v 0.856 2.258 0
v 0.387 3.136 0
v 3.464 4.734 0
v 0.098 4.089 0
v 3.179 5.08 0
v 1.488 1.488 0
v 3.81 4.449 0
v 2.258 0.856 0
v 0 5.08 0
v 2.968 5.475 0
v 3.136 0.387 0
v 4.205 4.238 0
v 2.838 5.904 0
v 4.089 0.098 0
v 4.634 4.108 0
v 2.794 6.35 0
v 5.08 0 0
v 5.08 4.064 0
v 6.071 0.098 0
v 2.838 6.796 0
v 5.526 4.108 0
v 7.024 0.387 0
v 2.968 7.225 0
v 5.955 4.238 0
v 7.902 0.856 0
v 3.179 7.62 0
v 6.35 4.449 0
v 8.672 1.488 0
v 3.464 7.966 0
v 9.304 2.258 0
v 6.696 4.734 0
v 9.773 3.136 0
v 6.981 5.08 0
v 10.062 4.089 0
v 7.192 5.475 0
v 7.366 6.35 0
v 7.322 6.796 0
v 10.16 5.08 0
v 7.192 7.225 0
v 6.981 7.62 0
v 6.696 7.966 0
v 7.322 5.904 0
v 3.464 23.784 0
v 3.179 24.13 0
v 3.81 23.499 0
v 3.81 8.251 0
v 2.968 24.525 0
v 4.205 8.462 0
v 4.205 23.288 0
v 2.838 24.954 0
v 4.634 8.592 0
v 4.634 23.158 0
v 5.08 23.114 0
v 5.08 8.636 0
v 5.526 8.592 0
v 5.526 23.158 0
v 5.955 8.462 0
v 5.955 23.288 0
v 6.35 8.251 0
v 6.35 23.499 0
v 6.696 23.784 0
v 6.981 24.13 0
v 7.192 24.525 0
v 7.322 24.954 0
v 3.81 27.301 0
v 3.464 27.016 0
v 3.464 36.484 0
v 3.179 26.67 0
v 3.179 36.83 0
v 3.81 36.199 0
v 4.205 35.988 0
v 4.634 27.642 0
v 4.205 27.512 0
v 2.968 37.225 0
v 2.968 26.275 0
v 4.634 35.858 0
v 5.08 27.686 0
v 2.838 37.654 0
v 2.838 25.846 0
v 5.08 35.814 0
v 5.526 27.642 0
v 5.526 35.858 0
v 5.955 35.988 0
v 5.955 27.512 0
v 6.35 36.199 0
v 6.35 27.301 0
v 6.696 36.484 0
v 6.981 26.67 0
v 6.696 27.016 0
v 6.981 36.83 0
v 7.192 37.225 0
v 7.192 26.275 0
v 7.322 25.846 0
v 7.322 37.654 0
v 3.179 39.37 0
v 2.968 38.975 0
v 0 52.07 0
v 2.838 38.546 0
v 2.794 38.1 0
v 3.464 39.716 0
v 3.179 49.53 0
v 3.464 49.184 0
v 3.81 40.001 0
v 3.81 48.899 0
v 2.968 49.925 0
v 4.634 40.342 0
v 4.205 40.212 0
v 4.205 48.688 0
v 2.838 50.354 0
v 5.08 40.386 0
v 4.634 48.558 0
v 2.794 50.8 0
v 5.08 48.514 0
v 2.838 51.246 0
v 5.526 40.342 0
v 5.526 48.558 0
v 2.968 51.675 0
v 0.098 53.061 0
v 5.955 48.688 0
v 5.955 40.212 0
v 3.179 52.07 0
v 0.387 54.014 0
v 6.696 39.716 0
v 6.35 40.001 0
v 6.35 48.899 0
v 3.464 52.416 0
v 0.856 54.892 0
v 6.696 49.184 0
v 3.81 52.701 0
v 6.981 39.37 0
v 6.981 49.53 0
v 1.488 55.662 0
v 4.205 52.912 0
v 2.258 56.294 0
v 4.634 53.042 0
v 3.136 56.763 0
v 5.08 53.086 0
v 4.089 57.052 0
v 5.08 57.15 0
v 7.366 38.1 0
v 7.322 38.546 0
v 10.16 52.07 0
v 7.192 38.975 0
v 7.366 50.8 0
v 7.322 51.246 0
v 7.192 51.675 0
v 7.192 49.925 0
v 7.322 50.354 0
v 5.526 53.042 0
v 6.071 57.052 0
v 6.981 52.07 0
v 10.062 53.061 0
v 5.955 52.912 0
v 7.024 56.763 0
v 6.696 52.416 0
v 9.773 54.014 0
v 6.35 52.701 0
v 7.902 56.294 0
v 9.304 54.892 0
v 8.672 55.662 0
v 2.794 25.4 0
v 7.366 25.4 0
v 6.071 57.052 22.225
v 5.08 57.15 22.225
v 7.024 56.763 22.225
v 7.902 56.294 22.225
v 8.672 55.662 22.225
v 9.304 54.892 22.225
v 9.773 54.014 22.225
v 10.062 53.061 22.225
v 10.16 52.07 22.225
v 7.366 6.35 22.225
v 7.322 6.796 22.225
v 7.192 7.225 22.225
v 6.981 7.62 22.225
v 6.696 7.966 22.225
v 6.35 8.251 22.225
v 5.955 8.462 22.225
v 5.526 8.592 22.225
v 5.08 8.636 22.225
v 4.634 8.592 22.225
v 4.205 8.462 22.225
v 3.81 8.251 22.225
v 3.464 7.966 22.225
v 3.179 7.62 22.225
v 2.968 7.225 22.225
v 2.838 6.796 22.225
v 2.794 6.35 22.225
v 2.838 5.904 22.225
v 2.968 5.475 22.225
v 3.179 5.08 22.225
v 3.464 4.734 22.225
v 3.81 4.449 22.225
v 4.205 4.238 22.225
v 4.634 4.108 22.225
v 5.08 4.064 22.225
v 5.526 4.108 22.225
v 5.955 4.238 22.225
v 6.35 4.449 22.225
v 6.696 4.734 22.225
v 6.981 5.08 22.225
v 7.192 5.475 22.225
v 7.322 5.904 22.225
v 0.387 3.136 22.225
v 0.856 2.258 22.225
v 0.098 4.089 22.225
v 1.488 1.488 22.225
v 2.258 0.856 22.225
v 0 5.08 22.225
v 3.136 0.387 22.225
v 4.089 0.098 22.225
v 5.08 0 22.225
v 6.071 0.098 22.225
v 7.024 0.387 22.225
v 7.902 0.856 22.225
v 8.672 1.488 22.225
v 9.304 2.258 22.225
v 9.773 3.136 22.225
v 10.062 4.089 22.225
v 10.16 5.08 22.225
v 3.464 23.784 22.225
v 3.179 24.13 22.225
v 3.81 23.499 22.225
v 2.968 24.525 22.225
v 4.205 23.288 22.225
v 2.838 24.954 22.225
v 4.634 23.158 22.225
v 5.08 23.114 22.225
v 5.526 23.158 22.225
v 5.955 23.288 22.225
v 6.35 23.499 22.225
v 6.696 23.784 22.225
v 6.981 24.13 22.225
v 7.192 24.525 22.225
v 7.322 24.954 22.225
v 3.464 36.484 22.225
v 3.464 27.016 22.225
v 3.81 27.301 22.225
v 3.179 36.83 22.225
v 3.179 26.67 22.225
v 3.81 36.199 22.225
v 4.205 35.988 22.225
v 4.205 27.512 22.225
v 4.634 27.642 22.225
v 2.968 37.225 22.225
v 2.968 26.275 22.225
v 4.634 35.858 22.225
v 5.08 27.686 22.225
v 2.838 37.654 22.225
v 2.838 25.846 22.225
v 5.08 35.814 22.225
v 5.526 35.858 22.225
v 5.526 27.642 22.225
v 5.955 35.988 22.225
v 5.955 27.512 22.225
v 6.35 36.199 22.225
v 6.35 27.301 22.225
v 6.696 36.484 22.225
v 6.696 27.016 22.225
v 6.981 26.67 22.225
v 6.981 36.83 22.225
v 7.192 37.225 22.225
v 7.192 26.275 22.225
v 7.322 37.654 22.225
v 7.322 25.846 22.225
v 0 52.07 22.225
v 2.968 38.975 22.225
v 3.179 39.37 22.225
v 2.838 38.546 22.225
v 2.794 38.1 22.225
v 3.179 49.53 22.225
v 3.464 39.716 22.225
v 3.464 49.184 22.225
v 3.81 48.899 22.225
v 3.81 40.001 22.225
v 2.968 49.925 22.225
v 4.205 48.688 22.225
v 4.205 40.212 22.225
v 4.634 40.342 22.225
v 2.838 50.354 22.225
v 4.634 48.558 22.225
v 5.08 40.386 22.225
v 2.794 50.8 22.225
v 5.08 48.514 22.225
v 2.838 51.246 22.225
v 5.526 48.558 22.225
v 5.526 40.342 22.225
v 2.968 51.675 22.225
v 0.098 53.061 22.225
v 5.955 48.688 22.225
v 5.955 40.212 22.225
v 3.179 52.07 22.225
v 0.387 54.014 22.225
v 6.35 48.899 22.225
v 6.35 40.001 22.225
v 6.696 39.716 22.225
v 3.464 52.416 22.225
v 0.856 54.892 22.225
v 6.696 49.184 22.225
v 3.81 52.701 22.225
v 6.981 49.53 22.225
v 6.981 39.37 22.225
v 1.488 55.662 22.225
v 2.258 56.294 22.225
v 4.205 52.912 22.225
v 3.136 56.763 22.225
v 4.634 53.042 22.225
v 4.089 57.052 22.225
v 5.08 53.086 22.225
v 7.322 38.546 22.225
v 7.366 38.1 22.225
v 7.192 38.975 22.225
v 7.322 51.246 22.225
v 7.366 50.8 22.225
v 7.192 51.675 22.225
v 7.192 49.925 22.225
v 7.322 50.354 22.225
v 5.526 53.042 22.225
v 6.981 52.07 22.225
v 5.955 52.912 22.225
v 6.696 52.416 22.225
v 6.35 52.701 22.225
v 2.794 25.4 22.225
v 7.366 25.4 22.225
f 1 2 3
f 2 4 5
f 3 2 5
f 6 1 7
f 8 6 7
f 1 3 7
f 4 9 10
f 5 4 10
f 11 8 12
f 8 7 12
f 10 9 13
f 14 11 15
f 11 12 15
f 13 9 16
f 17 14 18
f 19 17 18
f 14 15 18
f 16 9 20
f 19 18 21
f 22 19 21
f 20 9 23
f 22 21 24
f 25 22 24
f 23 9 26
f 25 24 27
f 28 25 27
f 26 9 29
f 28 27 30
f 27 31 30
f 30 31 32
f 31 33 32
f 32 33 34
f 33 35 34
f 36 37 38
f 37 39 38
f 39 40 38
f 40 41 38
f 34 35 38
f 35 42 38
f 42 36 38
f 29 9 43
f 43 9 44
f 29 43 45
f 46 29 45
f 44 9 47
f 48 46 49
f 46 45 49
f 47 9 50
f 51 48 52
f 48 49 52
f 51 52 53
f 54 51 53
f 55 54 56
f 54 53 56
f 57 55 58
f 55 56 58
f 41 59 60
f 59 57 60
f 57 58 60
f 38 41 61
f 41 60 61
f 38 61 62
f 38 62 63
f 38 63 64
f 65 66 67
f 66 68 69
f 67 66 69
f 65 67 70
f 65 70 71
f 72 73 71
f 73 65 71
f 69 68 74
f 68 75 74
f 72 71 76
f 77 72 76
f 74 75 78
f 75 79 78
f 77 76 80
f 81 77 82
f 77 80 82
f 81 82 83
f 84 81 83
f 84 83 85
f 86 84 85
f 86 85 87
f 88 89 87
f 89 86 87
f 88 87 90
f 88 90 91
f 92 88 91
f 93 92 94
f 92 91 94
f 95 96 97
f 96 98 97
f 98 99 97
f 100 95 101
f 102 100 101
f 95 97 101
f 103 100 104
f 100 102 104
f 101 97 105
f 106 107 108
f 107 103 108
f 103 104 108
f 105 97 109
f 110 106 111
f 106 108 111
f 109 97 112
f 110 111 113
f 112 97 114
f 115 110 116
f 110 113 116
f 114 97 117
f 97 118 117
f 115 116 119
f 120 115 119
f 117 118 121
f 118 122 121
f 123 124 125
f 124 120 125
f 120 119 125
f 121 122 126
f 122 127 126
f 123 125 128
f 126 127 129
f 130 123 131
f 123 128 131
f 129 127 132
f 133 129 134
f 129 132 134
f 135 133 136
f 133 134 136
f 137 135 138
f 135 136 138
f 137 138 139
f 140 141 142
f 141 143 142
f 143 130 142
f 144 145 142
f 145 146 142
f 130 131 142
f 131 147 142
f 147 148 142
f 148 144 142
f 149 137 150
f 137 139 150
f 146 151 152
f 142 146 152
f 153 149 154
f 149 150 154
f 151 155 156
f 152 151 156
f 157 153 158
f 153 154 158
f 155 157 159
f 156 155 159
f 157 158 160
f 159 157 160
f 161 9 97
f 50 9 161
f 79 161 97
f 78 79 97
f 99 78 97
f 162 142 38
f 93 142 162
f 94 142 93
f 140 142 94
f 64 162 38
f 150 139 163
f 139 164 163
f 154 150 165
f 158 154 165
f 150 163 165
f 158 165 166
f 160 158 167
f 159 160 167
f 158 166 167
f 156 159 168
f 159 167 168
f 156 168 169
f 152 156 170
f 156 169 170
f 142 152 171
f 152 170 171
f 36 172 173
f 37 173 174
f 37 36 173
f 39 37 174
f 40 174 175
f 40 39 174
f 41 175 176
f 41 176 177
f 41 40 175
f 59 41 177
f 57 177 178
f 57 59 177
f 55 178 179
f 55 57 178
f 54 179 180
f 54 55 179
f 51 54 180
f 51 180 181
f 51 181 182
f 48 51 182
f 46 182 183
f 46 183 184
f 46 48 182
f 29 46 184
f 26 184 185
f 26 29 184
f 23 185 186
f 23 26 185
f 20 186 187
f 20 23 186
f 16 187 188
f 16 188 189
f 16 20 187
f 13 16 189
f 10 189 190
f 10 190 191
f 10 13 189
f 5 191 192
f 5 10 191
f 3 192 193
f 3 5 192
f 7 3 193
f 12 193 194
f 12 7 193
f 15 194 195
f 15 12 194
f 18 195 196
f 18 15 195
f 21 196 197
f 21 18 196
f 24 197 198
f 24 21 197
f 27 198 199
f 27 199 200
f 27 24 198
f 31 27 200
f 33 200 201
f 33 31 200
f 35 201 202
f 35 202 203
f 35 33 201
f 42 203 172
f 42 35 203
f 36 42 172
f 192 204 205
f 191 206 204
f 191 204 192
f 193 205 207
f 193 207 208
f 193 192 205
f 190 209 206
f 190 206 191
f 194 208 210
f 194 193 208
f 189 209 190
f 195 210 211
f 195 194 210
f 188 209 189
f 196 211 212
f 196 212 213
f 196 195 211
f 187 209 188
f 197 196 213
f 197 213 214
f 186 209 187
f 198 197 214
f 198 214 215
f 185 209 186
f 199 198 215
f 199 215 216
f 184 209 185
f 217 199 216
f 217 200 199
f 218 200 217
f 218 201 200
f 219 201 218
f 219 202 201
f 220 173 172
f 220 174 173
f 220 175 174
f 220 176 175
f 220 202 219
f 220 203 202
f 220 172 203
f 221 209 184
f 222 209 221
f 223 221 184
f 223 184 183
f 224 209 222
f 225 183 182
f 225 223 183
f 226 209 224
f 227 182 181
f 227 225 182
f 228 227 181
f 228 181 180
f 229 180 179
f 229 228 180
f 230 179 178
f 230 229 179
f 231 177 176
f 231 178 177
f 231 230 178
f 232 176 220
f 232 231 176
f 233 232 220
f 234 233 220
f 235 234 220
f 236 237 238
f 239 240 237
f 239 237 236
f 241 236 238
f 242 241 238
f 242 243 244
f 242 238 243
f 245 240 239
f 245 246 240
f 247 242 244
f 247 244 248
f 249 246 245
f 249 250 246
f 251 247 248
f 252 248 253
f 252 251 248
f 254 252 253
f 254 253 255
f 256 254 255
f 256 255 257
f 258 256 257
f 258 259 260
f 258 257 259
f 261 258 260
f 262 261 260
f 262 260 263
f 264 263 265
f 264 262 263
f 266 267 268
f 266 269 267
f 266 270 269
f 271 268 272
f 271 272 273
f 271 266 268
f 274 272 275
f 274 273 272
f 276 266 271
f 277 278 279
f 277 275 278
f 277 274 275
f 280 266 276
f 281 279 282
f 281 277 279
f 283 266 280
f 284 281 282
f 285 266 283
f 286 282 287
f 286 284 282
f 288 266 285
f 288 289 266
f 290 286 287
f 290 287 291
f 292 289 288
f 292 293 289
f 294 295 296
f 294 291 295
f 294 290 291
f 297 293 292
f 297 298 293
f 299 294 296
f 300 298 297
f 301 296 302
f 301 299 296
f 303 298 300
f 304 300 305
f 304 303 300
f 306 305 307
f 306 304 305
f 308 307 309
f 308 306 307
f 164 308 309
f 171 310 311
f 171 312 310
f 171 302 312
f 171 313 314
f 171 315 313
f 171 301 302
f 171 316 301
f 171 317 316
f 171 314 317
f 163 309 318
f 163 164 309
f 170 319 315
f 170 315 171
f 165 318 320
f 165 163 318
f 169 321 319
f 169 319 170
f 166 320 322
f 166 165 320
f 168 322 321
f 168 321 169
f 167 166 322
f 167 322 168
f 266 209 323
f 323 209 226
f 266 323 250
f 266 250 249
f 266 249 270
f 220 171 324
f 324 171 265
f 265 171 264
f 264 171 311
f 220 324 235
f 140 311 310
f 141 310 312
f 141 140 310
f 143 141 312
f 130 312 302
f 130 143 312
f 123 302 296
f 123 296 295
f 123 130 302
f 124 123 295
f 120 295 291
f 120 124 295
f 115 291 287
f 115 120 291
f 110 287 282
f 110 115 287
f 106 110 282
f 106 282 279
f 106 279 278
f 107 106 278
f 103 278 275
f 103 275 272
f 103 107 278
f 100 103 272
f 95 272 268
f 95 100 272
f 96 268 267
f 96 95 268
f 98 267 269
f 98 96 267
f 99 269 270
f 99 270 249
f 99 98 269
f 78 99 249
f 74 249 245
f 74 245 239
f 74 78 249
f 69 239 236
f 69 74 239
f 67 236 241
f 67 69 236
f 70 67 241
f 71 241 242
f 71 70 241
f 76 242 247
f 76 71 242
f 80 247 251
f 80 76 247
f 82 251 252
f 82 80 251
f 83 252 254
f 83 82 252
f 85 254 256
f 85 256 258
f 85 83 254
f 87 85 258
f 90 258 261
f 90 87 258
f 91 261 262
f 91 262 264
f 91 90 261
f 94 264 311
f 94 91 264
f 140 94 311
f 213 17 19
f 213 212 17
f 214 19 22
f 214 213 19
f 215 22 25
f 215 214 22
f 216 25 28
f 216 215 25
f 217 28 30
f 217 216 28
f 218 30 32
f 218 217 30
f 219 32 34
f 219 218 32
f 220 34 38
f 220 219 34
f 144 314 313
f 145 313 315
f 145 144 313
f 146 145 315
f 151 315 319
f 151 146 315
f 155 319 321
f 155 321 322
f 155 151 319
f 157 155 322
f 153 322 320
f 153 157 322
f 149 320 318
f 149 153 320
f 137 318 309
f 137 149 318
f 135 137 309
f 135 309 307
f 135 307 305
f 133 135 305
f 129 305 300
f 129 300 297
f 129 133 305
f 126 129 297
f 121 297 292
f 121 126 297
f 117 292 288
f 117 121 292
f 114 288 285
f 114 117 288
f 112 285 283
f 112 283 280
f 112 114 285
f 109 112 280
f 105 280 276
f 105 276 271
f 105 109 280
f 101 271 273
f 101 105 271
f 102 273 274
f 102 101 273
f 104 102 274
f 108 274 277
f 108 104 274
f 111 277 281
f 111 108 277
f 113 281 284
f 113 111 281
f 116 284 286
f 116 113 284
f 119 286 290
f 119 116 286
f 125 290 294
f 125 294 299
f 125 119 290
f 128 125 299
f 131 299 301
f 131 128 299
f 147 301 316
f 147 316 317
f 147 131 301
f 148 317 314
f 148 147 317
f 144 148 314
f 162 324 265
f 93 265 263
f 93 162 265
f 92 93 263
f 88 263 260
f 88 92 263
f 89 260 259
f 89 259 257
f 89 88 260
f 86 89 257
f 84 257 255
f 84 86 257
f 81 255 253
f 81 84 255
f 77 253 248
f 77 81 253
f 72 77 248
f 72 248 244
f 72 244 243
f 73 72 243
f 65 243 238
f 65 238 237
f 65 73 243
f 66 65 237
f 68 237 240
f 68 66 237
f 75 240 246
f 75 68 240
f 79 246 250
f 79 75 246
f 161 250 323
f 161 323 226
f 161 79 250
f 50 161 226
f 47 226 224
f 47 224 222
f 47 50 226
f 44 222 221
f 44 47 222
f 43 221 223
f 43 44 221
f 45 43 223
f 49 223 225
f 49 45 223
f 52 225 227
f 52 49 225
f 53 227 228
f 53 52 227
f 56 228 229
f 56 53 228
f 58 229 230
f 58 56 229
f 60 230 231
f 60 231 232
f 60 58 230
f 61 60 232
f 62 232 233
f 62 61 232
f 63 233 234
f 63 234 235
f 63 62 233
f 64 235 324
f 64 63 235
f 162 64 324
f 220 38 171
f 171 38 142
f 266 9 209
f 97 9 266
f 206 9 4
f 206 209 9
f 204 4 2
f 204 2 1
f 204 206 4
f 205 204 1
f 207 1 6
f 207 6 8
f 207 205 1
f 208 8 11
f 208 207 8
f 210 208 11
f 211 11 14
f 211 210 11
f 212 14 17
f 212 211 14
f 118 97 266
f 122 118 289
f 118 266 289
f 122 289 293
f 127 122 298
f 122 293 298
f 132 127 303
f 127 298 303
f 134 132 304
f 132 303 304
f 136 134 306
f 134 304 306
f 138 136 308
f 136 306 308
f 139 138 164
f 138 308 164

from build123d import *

# Parameters (mm, degrees)
SKETCH1_W           = 10.16
SKETCH1_H           = 57.15
SKETCH1_R           = 2.286
BOSS_EXTRUDE1_DEPTH = 22.225
FILLET1_R           = 5.08


with BuildPart() as part:
    # Sketch1 → Boss-Extrude1 (new body)
    with BuildSketch(Plane.XY):
        with Locations((5.08, 28.575)):
            Rectangle(SKETCH1_W, SKETCH1_H)
        with Locations((5.08, 6.35)):
            Circle(SKETCH1_R, mode=Mode.SUBTRACT)
        with Locations((5.08, 25.4)):
            Circle(SKETCH1_R, mode=Mode.SUBTRACT)
        with Locations((5.08, 38.1)):
            Circle(SKETCH1_R, mode=Mode.SUBTRACT)
        with Locations((5.08, 50.8)):
            Circle(SKETCH1_R, mode=Mode.SUBTRACT)
    extrude(amount=BOSS_EXTRUDE1_DEPTH)

    # Fillet1
    fillet1_edges = [part.edges().sort_by_distance(p)[0] for p in [
        (10.16, 0, 11.1125),
        (0, 0, 11.1125),
        (0, 57.15, 11.1125),
        (10.16, 57.15, 11.1125),
    ]]
    fillet(fillet1_edges, radius=FILLET1_R - 0.0001)  # a hair under: the kernel refuses the full size


solid = part.part
